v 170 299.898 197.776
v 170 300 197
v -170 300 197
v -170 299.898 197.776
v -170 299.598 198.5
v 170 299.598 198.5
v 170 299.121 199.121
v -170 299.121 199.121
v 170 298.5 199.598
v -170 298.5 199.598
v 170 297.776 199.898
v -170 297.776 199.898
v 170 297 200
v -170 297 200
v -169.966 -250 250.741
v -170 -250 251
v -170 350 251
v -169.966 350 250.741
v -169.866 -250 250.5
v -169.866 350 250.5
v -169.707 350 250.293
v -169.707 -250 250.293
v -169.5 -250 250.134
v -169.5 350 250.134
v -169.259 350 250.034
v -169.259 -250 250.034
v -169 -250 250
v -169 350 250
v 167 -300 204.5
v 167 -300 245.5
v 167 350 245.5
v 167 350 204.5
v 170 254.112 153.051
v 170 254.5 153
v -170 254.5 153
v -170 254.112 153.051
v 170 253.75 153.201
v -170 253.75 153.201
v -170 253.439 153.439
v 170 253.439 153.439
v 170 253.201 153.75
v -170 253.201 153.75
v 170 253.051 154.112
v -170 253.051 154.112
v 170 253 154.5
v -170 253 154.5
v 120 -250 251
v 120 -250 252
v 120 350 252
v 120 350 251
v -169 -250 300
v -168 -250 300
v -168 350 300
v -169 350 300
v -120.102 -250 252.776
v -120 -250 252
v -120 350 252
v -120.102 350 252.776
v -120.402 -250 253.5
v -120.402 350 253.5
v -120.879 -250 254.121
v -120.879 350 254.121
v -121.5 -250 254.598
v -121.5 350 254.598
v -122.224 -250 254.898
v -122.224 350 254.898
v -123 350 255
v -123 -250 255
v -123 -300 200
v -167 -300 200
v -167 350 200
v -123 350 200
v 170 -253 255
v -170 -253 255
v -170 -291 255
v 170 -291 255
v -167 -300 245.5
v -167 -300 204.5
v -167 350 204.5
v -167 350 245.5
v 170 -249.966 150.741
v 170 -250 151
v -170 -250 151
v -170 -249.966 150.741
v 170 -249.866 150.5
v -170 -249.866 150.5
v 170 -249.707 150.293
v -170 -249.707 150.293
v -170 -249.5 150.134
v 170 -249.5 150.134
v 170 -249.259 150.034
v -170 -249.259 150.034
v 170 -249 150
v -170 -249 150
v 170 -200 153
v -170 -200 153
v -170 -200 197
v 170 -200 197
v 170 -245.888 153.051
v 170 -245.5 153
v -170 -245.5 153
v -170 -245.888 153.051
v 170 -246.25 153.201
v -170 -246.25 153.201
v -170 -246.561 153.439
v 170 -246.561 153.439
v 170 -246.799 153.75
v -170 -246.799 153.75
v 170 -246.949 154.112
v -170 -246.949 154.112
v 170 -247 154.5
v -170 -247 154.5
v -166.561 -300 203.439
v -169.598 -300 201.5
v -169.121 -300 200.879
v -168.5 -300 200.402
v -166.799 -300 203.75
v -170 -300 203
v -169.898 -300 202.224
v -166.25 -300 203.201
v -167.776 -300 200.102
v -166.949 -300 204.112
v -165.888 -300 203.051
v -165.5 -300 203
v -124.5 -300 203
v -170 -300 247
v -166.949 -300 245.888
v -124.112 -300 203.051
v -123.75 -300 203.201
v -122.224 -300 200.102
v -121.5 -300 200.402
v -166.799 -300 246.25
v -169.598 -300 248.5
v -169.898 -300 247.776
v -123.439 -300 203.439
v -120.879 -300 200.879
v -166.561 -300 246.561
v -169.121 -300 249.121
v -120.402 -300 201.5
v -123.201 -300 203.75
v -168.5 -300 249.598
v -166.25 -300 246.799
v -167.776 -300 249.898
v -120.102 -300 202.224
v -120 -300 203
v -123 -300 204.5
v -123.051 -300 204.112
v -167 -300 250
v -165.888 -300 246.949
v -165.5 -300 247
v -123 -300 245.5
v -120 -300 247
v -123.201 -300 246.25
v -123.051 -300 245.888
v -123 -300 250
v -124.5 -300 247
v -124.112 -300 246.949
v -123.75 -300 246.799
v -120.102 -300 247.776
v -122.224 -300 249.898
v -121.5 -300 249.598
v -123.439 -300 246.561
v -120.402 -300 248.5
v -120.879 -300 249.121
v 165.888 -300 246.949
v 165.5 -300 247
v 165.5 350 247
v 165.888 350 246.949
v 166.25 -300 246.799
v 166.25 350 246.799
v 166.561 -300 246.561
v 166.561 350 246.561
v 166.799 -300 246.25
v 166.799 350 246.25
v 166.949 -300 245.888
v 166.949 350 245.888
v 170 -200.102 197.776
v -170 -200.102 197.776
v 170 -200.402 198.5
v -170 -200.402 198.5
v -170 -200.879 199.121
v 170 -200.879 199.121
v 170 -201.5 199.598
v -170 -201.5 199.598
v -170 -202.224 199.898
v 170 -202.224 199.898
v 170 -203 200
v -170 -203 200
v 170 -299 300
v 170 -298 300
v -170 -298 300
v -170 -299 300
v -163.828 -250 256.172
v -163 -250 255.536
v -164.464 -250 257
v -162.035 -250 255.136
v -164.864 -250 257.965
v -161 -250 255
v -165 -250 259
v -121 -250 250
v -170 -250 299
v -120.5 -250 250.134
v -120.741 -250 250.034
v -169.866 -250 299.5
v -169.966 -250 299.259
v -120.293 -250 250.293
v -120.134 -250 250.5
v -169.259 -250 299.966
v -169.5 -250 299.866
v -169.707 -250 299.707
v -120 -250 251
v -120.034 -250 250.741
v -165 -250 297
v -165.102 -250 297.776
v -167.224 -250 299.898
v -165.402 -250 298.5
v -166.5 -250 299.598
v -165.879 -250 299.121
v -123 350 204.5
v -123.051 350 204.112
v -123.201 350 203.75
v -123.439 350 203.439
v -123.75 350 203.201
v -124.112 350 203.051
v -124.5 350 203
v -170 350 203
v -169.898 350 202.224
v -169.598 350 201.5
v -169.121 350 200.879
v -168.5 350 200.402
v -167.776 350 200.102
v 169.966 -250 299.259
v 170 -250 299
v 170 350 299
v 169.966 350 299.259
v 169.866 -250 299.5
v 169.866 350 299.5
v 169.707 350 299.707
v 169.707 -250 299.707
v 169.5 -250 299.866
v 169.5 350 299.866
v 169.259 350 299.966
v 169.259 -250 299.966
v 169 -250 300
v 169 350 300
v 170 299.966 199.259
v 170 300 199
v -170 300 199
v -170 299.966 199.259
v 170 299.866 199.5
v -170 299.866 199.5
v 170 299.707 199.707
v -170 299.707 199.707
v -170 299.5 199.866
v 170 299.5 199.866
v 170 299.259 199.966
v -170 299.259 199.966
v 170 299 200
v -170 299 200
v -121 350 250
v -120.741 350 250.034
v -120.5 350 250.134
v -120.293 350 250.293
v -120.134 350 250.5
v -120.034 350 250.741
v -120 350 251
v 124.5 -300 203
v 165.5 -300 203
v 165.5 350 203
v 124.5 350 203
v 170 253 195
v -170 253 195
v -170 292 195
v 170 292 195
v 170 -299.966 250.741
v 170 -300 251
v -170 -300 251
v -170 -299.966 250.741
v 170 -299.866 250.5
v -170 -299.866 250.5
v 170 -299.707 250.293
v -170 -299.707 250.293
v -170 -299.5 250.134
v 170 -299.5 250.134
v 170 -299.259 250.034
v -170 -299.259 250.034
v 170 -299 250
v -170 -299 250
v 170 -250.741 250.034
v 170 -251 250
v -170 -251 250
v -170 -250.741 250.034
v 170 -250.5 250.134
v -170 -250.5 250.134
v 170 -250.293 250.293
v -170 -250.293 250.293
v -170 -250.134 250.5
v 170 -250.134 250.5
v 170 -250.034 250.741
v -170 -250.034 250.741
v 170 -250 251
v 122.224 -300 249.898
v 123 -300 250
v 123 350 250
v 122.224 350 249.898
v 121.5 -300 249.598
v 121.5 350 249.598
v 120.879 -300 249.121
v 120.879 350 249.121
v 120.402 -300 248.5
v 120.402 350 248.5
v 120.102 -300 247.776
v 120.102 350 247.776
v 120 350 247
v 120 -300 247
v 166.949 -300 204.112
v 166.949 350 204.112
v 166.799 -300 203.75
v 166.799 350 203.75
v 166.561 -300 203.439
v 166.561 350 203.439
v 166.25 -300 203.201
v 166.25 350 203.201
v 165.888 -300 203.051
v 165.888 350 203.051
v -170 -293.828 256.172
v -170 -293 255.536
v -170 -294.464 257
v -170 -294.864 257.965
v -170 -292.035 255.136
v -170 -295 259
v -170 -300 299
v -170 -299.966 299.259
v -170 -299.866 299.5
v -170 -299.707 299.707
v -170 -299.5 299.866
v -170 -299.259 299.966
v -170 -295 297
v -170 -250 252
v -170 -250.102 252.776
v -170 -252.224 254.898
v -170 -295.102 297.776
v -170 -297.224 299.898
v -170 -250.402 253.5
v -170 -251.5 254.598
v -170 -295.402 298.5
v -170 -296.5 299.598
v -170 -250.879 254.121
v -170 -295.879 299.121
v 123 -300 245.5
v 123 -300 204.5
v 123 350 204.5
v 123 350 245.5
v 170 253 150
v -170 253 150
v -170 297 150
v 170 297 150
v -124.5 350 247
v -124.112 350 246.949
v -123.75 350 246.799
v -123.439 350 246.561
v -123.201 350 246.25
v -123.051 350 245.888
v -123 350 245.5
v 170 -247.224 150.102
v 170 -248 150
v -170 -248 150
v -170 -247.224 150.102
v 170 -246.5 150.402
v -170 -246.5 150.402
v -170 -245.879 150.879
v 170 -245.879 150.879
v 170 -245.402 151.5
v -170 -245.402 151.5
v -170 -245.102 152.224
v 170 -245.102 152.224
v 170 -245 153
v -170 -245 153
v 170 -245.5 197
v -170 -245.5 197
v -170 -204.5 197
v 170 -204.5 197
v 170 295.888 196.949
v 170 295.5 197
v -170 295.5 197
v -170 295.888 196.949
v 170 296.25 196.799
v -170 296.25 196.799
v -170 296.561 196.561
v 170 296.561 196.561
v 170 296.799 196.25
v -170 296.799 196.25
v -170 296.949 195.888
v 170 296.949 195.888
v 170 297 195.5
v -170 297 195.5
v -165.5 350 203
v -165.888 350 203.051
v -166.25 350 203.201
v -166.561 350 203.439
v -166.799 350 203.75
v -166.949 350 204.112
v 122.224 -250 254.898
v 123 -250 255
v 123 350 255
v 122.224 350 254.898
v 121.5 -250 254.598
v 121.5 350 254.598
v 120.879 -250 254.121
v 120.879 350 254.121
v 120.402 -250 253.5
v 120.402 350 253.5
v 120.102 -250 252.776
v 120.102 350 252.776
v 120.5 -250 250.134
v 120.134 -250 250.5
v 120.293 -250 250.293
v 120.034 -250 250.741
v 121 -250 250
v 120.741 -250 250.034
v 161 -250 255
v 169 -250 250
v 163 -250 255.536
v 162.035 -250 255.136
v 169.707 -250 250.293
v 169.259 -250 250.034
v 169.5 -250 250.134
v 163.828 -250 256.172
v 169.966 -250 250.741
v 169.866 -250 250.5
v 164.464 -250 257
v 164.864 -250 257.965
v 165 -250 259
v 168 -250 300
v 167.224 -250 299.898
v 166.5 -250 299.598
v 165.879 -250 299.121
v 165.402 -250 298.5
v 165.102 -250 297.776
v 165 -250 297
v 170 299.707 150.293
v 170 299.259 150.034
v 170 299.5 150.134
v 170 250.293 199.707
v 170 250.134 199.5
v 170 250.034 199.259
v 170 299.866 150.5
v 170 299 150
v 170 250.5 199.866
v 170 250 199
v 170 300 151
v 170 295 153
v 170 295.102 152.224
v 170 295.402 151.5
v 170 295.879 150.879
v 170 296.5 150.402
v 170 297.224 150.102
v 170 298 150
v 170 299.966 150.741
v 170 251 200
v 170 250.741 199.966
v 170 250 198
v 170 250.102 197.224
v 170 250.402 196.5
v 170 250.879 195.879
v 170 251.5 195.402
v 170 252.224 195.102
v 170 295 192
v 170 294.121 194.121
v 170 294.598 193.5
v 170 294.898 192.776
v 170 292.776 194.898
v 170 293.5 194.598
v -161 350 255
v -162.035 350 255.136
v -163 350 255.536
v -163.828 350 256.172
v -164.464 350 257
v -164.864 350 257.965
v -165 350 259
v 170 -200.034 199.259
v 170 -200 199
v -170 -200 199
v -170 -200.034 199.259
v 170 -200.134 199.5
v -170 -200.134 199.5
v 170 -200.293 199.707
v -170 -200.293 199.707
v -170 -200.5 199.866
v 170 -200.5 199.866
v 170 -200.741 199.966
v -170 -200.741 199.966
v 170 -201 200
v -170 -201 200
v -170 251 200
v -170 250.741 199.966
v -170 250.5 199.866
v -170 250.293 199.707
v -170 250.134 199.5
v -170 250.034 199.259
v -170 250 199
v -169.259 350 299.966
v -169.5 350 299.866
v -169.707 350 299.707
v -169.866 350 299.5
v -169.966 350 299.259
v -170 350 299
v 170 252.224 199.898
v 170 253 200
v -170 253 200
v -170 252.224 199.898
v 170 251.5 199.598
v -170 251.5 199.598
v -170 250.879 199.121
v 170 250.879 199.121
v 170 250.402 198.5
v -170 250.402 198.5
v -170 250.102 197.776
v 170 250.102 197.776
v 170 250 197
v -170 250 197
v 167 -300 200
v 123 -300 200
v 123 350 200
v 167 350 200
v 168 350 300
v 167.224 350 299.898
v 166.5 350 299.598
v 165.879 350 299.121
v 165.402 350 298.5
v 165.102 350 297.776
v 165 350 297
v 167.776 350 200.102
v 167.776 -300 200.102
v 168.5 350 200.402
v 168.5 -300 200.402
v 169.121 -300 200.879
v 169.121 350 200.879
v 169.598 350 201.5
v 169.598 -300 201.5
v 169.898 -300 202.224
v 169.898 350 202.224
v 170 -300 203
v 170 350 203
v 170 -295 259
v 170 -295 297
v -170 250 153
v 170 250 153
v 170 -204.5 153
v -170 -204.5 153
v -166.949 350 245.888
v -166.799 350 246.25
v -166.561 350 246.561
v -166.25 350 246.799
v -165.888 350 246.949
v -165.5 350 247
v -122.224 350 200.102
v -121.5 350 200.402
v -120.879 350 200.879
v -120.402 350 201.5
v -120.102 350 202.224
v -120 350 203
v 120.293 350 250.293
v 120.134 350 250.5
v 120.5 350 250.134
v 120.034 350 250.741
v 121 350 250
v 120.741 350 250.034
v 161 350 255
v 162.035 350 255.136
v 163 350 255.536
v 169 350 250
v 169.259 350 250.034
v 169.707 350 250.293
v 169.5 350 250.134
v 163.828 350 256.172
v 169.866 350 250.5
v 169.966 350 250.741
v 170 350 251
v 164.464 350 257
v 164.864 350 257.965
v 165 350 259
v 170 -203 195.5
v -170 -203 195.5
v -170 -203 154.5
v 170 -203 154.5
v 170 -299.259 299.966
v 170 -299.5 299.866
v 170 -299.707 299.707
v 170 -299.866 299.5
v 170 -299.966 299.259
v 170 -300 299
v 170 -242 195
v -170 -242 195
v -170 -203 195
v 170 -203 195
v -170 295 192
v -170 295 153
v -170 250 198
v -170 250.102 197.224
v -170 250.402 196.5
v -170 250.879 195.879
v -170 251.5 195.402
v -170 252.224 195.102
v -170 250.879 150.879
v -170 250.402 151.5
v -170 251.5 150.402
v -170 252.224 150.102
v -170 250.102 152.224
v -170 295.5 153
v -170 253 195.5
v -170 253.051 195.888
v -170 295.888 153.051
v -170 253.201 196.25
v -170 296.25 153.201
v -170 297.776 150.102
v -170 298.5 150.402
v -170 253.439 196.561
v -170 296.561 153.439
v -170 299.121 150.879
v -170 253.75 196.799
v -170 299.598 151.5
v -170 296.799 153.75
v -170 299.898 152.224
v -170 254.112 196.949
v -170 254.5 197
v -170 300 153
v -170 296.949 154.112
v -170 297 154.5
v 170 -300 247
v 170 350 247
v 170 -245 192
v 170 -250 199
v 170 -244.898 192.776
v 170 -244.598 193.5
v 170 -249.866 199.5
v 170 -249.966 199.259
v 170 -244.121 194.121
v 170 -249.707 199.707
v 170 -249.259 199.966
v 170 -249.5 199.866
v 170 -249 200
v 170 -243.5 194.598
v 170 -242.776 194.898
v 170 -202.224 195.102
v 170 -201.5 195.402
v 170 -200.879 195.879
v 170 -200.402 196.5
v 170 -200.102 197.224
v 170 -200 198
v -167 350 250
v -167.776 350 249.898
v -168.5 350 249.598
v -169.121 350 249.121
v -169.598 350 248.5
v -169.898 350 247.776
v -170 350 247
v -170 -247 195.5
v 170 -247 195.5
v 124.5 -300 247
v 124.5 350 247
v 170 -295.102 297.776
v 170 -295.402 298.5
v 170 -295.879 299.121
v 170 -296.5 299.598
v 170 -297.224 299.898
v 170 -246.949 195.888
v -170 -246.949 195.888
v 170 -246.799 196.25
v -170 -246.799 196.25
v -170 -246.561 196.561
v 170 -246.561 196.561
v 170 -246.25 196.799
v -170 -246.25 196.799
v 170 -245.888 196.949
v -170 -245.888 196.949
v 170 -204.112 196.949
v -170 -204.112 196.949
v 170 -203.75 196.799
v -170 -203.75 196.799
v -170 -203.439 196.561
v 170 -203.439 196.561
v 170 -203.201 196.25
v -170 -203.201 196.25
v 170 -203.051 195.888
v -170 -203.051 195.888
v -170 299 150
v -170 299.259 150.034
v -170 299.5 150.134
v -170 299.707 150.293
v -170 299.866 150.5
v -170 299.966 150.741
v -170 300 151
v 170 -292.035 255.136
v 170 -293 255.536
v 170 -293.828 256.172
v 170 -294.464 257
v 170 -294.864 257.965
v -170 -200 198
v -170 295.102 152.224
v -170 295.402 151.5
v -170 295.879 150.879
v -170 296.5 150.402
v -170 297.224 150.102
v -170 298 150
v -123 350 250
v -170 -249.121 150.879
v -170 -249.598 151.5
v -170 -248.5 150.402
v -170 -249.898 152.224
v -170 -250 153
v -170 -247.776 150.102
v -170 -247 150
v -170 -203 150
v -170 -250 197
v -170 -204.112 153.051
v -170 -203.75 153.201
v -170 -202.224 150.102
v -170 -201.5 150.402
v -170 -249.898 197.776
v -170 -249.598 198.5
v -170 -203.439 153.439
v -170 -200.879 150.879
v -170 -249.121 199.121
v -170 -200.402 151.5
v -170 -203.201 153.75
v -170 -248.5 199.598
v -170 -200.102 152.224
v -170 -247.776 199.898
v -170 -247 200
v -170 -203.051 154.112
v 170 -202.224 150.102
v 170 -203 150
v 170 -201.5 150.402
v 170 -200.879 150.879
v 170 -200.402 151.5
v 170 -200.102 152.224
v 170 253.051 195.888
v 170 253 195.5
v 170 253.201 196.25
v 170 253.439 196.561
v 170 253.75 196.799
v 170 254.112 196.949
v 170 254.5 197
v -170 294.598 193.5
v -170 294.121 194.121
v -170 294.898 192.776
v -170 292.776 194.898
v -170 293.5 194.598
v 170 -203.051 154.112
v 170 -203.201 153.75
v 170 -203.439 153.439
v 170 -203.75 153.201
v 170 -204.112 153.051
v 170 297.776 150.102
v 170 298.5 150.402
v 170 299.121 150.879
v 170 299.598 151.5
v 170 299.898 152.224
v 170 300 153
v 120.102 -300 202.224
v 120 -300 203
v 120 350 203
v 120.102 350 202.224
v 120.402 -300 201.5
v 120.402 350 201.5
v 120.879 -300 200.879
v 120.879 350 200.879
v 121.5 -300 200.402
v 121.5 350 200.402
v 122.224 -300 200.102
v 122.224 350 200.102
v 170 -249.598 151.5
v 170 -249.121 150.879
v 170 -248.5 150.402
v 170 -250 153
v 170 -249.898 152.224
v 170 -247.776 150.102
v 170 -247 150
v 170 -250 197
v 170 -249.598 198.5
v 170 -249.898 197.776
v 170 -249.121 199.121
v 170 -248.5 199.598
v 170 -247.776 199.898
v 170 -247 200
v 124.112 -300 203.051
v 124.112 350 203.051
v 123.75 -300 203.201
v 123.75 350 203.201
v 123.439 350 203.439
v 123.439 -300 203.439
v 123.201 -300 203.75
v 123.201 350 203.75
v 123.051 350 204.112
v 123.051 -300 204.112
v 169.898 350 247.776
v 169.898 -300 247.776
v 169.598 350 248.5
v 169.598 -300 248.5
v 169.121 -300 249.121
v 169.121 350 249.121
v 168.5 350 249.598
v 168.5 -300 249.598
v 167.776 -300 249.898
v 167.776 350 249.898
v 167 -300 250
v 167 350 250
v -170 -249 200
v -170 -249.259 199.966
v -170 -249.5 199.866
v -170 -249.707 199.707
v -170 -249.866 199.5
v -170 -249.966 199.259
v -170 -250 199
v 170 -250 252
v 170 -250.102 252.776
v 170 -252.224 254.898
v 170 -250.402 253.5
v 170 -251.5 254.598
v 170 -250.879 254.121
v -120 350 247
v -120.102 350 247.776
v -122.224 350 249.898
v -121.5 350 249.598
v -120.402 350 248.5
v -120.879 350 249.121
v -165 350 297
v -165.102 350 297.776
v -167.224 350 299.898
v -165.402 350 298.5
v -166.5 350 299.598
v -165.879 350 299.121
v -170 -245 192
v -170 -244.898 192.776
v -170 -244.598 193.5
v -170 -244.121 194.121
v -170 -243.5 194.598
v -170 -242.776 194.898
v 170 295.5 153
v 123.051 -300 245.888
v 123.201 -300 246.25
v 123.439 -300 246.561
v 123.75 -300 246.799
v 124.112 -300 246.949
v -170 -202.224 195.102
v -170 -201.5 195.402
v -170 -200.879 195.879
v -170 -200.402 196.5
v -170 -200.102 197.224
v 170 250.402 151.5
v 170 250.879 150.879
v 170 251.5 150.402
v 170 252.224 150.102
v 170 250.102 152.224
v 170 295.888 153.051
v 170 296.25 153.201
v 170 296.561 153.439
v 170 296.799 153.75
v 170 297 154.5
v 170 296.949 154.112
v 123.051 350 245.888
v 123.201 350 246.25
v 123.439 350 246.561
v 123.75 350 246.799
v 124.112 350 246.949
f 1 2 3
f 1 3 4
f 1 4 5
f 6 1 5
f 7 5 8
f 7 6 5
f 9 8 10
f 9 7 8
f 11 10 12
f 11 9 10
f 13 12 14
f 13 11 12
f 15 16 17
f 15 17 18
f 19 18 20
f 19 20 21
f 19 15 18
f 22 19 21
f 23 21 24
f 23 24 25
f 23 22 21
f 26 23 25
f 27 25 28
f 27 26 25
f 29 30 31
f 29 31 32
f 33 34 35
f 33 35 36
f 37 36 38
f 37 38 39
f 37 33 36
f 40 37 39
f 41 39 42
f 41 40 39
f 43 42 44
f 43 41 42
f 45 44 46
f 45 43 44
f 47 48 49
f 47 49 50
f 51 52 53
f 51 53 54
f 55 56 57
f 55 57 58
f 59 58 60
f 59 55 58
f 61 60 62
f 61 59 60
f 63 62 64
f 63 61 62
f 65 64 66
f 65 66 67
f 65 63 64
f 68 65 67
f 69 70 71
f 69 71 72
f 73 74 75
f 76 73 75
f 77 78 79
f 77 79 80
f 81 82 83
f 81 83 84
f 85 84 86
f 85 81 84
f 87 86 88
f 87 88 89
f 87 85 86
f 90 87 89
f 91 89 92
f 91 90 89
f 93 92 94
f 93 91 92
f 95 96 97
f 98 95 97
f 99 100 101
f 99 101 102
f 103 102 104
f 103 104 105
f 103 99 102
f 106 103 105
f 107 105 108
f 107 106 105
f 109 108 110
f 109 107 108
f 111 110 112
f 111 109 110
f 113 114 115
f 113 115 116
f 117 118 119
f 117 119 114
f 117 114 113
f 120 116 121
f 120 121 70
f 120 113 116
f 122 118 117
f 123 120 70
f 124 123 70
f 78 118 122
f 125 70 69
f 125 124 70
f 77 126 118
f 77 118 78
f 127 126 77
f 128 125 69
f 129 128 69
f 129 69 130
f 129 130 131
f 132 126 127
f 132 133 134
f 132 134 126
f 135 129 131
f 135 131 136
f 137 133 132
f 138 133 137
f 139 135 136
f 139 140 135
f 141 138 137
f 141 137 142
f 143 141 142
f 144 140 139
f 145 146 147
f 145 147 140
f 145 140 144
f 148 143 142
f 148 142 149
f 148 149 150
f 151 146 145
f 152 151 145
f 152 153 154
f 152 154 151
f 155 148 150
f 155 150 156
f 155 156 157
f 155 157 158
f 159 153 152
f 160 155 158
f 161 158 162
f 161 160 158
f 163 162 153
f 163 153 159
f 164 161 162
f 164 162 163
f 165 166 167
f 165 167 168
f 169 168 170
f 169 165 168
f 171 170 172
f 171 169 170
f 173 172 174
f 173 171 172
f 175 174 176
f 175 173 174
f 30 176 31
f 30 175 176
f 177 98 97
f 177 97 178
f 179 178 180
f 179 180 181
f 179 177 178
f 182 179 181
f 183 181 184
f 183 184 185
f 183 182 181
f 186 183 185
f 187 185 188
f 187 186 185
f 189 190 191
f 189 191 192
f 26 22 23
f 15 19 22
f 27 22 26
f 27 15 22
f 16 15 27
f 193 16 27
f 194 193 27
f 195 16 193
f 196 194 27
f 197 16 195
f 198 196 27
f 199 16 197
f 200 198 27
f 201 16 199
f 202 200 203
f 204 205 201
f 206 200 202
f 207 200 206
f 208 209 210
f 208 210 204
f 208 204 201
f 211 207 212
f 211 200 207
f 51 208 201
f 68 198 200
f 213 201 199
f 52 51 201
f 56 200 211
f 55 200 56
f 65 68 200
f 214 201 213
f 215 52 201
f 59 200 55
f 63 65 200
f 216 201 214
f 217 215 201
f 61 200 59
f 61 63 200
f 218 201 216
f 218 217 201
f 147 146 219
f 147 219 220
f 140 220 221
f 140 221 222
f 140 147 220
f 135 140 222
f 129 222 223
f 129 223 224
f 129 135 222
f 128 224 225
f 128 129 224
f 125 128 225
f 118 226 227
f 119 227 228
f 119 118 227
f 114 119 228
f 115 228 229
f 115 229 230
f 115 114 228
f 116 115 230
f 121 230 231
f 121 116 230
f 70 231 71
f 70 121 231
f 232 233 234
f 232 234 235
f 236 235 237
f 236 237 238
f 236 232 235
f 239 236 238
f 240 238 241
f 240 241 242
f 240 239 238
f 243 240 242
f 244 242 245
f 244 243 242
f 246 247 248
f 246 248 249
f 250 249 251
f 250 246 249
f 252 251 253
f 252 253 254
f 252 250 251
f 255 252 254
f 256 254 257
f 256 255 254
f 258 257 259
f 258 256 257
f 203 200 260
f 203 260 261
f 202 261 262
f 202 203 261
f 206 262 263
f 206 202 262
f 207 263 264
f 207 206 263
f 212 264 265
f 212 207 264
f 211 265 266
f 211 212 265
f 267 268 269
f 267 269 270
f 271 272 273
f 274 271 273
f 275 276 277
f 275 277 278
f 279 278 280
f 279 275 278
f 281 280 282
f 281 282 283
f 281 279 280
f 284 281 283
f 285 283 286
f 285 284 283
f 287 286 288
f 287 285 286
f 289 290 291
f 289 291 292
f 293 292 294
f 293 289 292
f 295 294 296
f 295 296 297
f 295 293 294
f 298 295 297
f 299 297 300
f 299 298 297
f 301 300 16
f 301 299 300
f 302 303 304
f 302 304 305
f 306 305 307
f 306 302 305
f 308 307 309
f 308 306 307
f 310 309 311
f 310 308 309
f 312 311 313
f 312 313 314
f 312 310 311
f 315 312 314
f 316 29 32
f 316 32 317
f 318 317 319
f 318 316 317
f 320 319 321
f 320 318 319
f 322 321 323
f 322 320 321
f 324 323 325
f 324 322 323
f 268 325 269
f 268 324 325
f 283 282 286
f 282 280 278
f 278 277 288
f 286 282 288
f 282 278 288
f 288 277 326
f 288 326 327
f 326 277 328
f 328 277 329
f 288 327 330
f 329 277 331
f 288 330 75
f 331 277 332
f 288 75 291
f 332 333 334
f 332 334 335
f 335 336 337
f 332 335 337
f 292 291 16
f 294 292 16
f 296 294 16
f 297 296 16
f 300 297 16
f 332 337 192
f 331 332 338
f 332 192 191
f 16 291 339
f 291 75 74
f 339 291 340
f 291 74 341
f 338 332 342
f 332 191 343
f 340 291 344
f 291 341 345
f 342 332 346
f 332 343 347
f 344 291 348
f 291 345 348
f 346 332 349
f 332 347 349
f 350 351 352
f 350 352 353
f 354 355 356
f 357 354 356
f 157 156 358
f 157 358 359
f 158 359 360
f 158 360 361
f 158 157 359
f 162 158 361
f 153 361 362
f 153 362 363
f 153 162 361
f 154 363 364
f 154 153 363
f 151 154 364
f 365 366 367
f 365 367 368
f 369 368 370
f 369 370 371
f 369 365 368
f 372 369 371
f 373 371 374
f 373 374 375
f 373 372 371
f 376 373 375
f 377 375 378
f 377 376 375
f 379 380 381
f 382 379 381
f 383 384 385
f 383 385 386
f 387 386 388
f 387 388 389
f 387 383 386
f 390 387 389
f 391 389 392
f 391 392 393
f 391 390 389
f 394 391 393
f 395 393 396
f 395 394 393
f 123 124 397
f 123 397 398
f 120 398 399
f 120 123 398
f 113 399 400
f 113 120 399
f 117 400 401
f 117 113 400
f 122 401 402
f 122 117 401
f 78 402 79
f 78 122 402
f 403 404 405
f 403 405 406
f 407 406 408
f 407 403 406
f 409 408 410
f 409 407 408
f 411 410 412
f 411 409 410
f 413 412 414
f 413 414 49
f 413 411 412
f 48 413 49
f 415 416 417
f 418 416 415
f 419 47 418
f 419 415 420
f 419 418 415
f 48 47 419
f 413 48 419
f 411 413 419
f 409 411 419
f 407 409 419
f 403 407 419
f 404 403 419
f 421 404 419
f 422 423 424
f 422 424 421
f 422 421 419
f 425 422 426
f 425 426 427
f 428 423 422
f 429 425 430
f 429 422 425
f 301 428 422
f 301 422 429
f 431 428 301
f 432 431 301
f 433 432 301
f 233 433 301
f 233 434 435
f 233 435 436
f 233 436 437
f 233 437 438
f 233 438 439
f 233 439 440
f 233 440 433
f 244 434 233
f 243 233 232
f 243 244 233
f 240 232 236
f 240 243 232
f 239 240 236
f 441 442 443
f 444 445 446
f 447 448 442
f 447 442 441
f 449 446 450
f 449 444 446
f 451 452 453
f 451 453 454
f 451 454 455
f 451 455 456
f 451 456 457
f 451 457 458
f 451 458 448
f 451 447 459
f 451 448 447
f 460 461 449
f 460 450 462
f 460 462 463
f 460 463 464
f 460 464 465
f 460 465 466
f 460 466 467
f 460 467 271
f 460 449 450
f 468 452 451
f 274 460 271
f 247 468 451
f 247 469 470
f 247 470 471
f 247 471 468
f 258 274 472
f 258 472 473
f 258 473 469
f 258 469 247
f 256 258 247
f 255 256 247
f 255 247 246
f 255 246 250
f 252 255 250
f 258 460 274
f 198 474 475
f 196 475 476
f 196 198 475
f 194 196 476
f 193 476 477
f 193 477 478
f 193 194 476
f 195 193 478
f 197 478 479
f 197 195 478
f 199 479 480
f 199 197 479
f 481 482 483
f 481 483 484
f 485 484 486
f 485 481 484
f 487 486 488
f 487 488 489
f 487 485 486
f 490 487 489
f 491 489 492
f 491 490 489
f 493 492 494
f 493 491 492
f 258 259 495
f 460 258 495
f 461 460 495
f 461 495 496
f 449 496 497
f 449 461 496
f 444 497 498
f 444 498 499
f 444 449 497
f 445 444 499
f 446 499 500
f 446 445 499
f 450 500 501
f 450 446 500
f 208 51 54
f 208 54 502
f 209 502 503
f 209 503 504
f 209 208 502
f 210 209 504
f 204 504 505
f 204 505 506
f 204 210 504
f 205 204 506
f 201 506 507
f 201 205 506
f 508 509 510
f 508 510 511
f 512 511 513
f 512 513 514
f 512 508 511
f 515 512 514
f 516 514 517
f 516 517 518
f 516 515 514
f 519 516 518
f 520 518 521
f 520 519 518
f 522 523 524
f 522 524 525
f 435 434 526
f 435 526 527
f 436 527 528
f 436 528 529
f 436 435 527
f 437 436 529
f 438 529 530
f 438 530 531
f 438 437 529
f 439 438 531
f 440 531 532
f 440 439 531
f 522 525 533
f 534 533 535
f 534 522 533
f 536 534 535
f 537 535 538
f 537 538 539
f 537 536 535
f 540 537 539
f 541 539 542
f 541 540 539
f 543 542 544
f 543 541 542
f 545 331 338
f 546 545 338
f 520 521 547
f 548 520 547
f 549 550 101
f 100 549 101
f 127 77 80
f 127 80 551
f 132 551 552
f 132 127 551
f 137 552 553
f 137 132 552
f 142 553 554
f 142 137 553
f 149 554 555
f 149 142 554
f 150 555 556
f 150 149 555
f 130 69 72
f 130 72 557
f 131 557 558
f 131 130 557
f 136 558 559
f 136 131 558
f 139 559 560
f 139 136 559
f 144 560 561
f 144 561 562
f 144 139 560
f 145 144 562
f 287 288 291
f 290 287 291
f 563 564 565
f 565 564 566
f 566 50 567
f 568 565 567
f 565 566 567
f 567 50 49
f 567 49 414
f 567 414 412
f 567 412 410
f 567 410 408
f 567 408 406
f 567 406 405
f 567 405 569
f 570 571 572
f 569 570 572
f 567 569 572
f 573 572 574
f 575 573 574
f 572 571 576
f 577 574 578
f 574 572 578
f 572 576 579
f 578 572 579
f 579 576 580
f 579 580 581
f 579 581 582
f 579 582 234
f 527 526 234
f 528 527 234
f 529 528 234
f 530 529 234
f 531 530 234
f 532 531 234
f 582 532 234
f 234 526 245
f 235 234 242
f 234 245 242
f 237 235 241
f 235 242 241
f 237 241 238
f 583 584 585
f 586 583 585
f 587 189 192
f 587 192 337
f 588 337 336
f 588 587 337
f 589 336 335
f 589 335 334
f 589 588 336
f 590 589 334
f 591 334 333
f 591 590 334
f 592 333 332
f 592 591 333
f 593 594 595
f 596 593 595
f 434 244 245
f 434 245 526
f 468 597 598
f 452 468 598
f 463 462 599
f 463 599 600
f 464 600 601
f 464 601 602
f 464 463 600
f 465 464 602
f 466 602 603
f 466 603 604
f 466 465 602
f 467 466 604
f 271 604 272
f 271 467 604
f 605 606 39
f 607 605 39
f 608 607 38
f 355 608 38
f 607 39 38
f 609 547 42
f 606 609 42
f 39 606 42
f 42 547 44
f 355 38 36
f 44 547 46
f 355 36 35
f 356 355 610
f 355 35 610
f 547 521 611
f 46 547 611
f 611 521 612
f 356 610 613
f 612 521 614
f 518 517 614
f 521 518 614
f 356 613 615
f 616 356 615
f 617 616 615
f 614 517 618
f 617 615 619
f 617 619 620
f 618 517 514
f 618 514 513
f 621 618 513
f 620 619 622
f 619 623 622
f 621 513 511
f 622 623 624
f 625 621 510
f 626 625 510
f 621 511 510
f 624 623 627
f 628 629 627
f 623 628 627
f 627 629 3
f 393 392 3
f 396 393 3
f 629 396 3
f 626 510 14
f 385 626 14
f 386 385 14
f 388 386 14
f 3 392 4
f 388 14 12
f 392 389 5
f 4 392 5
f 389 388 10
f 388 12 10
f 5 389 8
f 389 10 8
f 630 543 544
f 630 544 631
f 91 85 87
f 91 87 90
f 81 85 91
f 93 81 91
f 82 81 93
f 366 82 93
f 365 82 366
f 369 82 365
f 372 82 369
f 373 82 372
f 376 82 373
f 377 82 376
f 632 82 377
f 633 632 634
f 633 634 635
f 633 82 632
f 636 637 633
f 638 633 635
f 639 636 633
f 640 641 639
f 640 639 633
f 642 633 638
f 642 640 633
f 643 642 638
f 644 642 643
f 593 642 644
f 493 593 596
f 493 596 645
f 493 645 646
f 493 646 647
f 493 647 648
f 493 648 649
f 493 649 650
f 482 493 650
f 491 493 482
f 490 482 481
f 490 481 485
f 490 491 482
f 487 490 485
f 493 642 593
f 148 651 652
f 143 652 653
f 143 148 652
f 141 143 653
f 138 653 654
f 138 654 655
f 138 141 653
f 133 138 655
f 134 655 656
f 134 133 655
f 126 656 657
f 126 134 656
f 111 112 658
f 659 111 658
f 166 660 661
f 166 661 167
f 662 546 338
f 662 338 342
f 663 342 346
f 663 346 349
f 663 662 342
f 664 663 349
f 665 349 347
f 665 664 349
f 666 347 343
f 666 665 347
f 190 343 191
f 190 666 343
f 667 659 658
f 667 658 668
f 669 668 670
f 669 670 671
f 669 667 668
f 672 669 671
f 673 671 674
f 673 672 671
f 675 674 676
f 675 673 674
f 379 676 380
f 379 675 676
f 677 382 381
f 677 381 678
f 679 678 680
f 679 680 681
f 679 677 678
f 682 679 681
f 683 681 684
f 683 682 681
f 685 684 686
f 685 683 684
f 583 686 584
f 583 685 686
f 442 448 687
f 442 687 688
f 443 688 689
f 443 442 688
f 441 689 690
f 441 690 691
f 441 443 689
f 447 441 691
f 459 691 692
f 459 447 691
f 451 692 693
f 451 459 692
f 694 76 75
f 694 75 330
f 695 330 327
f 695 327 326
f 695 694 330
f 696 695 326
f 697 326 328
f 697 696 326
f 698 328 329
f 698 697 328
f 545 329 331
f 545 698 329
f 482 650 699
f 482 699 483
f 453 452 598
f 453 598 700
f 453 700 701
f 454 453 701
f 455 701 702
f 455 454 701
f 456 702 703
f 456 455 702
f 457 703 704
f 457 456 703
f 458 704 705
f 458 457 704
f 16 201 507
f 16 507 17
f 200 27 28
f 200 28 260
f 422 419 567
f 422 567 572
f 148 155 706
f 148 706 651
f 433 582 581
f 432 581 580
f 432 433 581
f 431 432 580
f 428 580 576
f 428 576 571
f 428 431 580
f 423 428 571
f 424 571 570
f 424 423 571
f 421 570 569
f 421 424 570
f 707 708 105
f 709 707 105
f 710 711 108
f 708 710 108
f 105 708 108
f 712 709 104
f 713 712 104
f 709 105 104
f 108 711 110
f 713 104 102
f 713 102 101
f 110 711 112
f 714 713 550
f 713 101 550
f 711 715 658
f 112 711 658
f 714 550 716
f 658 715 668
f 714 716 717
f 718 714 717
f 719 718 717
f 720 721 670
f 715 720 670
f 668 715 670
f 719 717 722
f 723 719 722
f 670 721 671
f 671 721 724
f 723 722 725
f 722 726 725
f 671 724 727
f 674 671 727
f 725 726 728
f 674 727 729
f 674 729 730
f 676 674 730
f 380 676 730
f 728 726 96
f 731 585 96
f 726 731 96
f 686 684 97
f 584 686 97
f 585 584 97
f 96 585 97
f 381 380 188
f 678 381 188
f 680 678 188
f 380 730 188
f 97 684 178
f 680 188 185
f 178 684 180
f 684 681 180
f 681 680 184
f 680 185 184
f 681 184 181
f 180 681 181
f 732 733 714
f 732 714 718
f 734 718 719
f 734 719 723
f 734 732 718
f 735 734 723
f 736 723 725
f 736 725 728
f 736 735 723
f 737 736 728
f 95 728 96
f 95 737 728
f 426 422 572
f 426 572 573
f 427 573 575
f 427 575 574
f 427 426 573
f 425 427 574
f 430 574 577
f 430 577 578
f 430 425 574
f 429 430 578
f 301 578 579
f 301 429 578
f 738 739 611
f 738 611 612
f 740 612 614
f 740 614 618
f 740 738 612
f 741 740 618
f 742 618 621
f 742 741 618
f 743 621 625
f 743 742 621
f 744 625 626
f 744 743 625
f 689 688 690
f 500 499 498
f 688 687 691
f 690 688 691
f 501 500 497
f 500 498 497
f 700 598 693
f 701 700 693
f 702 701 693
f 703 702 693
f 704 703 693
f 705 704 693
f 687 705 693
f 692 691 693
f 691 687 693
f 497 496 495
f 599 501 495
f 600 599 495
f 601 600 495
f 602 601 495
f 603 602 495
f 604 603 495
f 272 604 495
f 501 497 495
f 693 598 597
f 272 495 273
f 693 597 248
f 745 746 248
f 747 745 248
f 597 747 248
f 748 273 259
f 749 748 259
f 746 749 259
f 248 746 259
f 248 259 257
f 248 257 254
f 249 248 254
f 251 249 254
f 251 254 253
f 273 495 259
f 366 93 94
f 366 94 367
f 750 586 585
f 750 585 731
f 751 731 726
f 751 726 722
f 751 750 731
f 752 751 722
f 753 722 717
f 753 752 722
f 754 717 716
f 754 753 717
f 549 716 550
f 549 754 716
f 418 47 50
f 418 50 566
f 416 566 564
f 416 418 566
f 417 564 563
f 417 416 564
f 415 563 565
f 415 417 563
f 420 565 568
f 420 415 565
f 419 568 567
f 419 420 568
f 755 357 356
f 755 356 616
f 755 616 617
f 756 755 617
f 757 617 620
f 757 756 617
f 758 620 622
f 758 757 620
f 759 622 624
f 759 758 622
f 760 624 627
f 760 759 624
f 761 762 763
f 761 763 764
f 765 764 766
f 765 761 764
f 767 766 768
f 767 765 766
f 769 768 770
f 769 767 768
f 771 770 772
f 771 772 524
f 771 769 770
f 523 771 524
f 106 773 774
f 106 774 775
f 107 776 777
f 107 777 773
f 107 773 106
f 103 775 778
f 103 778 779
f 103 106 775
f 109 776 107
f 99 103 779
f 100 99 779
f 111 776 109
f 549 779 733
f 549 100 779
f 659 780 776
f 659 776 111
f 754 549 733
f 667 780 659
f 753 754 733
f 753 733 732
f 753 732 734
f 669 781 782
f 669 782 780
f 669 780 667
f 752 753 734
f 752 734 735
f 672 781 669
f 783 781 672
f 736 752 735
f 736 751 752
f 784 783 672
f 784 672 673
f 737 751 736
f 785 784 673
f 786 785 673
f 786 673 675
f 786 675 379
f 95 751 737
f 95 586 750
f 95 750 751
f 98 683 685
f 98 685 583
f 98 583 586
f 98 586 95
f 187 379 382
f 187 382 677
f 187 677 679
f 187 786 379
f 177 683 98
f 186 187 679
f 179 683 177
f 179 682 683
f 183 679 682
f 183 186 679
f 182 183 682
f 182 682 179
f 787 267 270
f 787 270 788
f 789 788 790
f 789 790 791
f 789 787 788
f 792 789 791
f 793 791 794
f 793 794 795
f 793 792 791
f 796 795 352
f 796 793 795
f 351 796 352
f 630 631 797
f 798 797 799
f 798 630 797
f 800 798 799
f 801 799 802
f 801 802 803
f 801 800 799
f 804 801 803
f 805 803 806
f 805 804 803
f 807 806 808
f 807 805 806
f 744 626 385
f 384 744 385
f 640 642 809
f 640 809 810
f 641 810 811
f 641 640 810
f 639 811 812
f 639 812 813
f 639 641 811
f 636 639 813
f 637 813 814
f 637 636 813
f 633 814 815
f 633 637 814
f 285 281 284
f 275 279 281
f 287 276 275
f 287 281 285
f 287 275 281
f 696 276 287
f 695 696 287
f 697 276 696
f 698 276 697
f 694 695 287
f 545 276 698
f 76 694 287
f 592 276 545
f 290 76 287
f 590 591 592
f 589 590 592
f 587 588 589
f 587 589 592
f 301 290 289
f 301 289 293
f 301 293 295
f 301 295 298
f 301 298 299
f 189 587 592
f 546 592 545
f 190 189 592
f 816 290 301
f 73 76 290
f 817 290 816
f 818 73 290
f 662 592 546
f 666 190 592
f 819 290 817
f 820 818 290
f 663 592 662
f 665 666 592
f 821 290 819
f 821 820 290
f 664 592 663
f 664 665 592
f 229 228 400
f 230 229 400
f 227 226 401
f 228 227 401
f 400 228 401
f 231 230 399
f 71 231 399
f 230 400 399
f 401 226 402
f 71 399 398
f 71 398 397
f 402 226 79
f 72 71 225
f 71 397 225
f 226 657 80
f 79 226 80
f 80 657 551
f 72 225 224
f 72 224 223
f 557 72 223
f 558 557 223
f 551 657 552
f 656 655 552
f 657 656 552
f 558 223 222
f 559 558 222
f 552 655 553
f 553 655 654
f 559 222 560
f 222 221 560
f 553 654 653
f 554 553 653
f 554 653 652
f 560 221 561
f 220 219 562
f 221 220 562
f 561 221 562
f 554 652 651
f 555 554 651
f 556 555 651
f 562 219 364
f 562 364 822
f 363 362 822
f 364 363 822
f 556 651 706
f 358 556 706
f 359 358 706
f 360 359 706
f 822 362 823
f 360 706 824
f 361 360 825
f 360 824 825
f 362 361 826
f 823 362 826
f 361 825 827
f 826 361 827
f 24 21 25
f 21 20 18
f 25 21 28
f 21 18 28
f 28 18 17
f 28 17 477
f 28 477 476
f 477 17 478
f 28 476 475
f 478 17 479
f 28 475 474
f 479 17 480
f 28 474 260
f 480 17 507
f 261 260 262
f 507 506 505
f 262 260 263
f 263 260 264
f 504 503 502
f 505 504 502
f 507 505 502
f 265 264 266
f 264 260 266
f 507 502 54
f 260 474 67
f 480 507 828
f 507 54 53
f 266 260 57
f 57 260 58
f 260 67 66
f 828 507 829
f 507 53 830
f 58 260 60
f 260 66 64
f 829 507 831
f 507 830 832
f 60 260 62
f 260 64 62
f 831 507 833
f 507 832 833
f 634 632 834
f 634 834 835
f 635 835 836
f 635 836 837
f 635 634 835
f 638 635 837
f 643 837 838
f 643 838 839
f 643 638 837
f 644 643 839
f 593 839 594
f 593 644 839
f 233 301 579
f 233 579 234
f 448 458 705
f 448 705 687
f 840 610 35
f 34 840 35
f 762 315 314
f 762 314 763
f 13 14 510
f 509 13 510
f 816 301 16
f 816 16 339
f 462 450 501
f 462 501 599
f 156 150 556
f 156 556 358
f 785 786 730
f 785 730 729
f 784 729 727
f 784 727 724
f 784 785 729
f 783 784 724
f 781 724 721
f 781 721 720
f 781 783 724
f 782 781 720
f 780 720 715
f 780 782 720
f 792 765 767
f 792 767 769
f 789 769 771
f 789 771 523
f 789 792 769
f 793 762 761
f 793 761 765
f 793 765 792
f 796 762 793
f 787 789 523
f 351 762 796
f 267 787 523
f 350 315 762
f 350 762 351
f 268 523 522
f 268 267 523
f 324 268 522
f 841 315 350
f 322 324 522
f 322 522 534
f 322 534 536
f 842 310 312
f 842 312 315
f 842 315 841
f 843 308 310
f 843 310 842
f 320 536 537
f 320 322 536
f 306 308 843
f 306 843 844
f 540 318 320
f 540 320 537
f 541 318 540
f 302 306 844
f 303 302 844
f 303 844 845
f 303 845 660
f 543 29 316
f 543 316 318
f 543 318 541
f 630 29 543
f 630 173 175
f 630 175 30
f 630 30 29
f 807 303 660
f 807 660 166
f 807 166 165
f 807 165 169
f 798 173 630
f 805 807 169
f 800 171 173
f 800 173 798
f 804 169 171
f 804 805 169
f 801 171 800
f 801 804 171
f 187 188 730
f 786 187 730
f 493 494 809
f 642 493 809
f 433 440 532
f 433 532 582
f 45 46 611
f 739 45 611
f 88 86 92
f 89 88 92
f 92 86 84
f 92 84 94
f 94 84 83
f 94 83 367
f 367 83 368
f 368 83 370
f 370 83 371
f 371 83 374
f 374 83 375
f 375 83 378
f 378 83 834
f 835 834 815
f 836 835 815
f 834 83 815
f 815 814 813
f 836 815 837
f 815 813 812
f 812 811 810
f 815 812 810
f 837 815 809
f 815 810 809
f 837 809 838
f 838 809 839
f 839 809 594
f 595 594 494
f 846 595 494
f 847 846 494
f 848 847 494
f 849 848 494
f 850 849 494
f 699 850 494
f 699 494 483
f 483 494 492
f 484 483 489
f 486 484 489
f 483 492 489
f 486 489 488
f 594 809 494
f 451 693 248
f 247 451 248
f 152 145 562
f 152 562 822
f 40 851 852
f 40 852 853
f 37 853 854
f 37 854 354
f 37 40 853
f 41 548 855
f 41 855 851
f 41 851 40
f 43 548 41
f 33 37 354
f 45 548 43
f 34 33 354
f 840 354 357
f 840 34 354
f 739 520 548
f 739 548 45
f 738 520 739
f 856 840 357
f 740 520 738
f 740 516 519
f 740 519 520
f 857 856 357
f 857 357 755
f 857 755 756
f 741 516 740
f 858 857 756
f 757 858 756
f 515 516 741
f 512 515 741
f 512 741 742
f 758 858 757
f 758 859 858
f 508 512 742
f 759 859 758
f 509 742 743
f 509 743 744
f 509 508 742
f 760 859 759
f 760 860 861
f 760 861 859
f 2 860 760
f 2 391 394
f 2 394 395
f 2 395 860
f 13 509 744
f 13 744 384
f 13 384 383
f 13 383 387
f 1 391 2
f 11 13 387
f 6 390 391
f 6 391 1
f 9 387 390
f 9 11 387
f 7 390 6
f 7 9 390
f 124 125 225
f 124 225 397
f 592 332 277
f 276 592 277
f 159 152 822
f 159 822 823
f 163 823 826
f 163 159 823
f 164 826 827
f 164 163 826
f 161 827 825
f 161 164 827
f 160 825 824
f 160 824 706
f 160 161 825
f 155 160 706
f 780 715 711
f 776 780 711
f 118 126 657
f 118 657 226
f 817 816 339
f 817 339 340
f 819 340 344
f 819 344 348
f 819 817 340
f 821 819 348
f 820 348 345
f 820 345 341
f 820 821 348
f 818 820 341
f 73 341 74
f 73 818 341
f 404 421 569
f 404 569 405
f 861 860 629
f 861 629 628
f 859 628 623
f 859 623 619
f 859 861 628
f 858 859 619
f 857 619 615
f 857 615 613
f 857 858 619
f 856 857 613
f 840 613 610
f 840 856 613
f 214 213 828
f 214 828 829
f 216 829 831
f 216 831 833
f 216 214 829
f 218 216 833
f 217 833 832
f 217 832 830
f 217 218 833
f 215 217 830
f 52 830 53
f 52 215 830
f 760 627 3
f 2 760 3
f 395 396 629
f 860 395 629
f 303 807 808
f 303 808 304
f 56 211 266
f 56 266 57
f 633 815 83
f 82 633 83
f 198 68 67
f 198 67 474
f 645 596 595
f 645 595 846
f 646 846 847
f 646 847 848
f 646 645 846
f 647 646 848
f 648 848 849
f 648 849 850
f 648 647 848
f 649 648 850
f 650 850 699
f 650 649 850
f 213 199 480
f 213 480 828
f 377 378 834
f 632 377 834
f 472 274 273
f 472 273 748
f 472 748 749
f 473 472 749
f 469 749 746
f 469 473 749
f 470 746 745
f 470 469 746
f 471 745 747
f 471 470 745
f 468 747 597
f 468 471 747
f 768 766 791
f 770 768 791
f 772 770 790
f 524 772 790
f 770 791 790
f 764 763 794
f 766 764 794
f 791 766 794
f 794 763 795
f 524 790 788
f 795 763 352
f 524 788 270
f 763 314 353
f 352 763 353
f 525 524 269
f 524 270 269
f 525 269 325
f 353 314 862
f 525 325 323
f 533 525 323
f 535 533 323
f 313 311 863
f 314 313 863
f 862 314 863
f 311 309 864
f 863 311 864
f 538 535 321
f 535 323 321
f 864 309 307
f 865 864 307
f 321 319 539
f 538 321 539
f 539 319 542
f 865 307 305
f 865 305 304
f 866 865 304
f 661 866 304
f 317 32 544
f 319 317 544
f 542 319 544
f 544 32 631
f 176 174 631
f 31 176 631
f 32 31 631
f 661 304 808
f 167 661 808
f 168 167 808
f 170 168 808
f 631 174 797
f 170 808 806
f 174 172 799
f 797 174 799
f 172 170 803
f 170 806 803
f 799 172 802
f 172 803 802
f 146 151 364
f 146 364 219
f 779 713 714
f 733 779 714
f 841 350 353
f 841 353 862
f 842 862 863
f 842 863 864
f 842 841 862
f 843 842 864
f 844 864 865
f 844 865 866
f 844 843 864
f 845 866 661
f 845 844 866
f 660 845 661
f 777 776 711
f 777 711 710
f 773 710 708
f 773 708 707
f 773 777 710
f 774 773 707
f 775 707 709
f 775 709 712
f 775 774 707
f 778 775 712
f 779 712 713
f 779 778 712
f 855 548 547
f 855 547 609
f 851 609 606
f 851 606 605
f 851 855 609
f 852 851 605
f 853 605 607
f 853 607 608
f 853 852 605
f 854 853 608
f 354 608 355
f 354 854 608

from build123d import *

# Parameters (mm, degrees)
F2_DEPTH  = 650
F5_DEPTH  = 600
F8_DEPTH  = 340
F10_DEPTH = 340
F12_DEPTH = 340


with BuildPart() as f2:
    # F1 (on offset) → F2 (new body)
    with BuildSketch(Plane.XZ.offset(300)):
        with BuildLine():
            Line((-123, 250), (-167, 250))
            ThreePointArc((-167, 250), (-169.12132, 249.12132), (-170, 247))
            Line((-170, 247), (-170, 203))
            ThreePointArc((-170, 203), (-169.12132, 200.87868), (-167, 200))
            Line((-167, 200), (-123, 200))
            ThreePointArc((-123, 200), (-120.87868, 200.87868), (-120, 203))
            Line((-120, 203), (-120, 247))
            ThreePointArc((-120, 247), (-120.87868, 249.12132), (-123, 250))
        make_face()
        with BuildLine():
            Line((-124.5, 203), (-165.5, 203))
            ThreePointArc((-165.5, 203), (-166.56066, 203.43934), (-167, 204.5))
            Line((-167, 204.5), (-167, 245.5))
            ThreePointArc((-167, 245.5), (-166.56066, 246.56066), (-165.5, 247))
            Line((-165.5, 247), (-124.5, 247))
            ThreePointArc((-124.5, 247), (-123.43934, 246.56066), (-123, 245.5))
            Line((-123, 245.5), (-123, 204.5))
            ThreePointArc((-123, 204.5), (-123.43934, 203.43934), (-124.5, 203))
        make_face(mode=Mode.SUBTRACT)
        with BuildLine():
            Line((167, 250), (123, 250))
            ThreePointArc((123, 250), (120.87868, 249.12132), (120, 247))
            Line((120, 247), (120, 203))
            ThreePointArc((120, 203), (120.87868, 200.87868), (123, 200))
            Line((123, 200), (167, 200))
            ThreePointArc((167, 200), (169.12132, 200.87868), (170, 203))
            Line((170, 203), (170, 247))
            ThreePointArc((170, 247), (169.12132, 249.12132), (167, 250))
        make_face()
        with BuildLine():
            Line((165.5, 203), (124.5, 203))
            ThreePointArc((124.5, 203), (123.43934, 203.43934), (123, 204.5))
            Line((123, 204.5), (123, 245.5))
            ThreePointArc((123, 245.5), (123.43934, 246.56066), (124.5, 247))
            Line((124.5, 247), (165.5, 247))
            ThreePointArc((165.5, 247), (166.56066, 246.56066), (167, 245.5))
            Line((167, 245.5), (167, 204.5))
            ThreePointArc((167, 204.5), (166.56066, 203.43934), (165.5, 203))
        make_face(mode=Mode.SUBTRACT)
    extrude(amount=-F2_DEPTH)


with BuildPart() as f5:
    # F4 (on offset) → F5 (new body)
    with BuildSketch(Plane.XZ.offset(250)):
        with BuildLine():
            Line((-168, 300), (-169, 300))
            ThreePointArc((-169, 300), (-169.707107, 299.707107), (-170, 299))
            Line((-170, 299), (-170, 251))
            ThreePointArc((-170, 251), (-169.707107, 250.292893), (-169, 250))
            Line((-169, 250), (-121, 250))
            ThreePointArc((-121, 250), (-120.292893, 250.292893), (-120, 251))
            Line((-120, 251), (-120, 252))
            ThreePointArc((-120, 252), (-120.87868, 254.12132), (-123, 255))
            Line((-123, 255), (-161, 255))
            ThreePointArc((-161, 255), (-163.828427, 256.171573), (-165, 259))
            Line((-165, 259), (-165, 297))
            ThreePointArc((-165, 297), (-165.87868, 299.12132), (-168, 300))
        make_face()
        with BuildLine():
            ThreePointArc((169, 250), (169.707107, 250.292893), (170, 251))
            Line((170, 251), (170, 299))
            ThreePointArc((170, 299), (169.707107, 299.707107), (169, 300))
            Line((169, 300), (168, 300))
            ThreePointArc((168, 300), (165.87868, 299.12132), (165, 297))
            Line((165, 297), (165, 259))
            ThreePointArc((165, 259), (163.828427, 256.171573), (161, 255))
            Line((161, 255), (123, 255))
            ThreePointArc((123, 255), (120.87868, 254.12132), (120, 252))
            Line((120, 252), (120, 251))
            ThreePointArc((120, 251), (120.292893, 250.292893), (121, 250))
            Line((121, 250), (169, 250))
        make_face()
    extrude(amount=-F5_DEPTH)


with BuildPart() as f8:
    # F7 (on offset) → F8 (new body)
    with BuildSketch(Plane.YZ.offset(170)):
        with BuildLine():
            ThreePointArc((-299, 300), (-299.707107, 299.707107), (-300, 299))
            Line((-300, 299), (-300, 251))
            ThreePointArc((-300, 251), (-299.707107, 250.292893), (-299, 250))
            Line((-299, 250), (-251, 250))
            ThreePointArc((-251, 250), (-250.292893, 250.292893), (-250, 251))
            Line((-250, 251), (-250, 252))
            ThreePointArc((-250, 252), (-250.87868, 254.12132), (-253, 255))
            Line((-253, 255), (-291, 255))
            ThreePointArc((-291, 255), (-293.828427, 256.171573), (-295, 259))
            Line((-295, 259), (-295, 297))
            ThreePointArc((-295, 297), (-295.87868, 299.12132), (-298, 300))
            Line((-298, 300), (-299, 300))
        make_face()
    extrude(amount=-F8_DEPTH)


with BuildPart() as f10:
    # F9 (on offset) → F10 (new body)
    with BuildSketch(Plane.YZ.offset(170)):
        with BuildLine():
            Line((-203, 200), (-247, 200))
            ThreePointArc((-247, 200), (-249.12132, 199.12132), (-250, 197))
            Line((-250, 197), (-250, 153))
            ThreePointArc((-250, 153), (-249.12132, 150.87868), (-247, 150))
            Line((-247, 150), (-203, 150))
            ThreePointArc((-203, 150), (-200.87868, 150.87868), (-200, 153))
            Line((-200, 153), (-200, 197))
            ThreePointArc((-200, 197), (-200.87868, 199.12132), (-203, 200))
        make_face()
        with BuildLine():
            ThreePointArc((-204.5, 197), (-203.43934, 196.56066), (-203, 195.5))
            Line((-203, 195.5), (-203, 154.5))
            ThreePointArc((-203, 154.5), (-203.43934, 153.43934), (-204.5, 153))
            Line((-204.5, 153), (-245.5, 153))
            ThreePointArc((-245.5, 153), (-246.56066, 153.43934), (-247, 154.5))
            Line((-247, 154.5), (-247, 195.5))
            ThreePointArc((-247, 195.5), (-246.56066, 196.56066), (-245.5, 197))
            Line((-245.5, 197), (-204.5, 197))
        make_face(mode=Mode.SUBTRACT)
        with BuildLine():
            Line((297, 200), (253, 200))
            ThreePointArc((253, 200), (250.87868, 199.12132), (250, 197))
            Line((250, 197), (250, 153))
            ThreePointArc((250, 153), (250.87868, 150.87868), (253, 150))
            Line((253, 150), (297, 150))
            ThreePointArc((297, 150), (299.12132, 150.87868), (300, 153))
            Line((300, 153), (300, 197))
            ThreePointArc((300, 197), (299.12132, 199.12132), (297, 200))
        make_face()
        with BuildLine():
            ThreePointArc((253, 195.5), (253.43934, 196.56066), (254.5, 197))
            Line((254.5, 197), (295.5, 197))
            ThreePointArc((295.5, 197), (296.56066, 196.56066), (297, 195.5))
            Line((297, 195.5), (297, 154.5))
            ThreePointArc((297, 154.5), (296.56066, 153.43934), (295.5, 153))
            Line((295.5, 153), (254.5, 153))
            ThreePointArc((254.5, 153), (253.43934, 153.43934), (253, 154.5))
            Line((253, 154.5), (253, 195.5))
        make_face(mode=Mode.SUBTRACT)
    extrude(amount=-F10_DEPTH)


with BuildPart() as f12:
    # F11 (on offset) → F12 (new body)
    with BuildSketch(Plane.YZ.offset(170)):
        with BuildLine():
            Line((-200, 198), (-200, 199))
            ThreePointArc((-200, 199), (-200.292893, 199.707107), (-201, 200))
            Line((-201, 200), (-249, 200))
            ThreePointArc((-249, 200), (-249.707107, 199.707107), (-250, 199))
            Line((-250, 199), (-250, 151))
            ThreePointArc((-250, 151), (-249.707107, 150.292893), (-249, 150))
            Line((-249, 150), (-248, 150))
            ThreePointArc((-248, 150), (-245.87868, 150.87868), (-245, 153))
            Line((-245, 153), (-245, 192))
            ThreePointArc((-245, 192), (-244.12132, 194.12132), (-242, 195))
            Line((-242, 195), (-203, 195))
            ThreePointArc((-203, 195), (-200.87868, 195.87868), (-200, 198))
        make_face()
        with BuildLine():
            ThreePointArc((251, 200), (250.292893, 199.707107), (250, 199))
            Line((250, 199), (250, 198))
            ThreePointArc((250, 198), (250.87868, 195.87868), (253, 195))
            Line((253, 195), (292, 195))
            ThreePointArc((292, 195), (294.12132, 194.12132), (295, 192))
            Line((295, 192), (295, 153))
            ThreePointArc((295, 153), (295.87868, 150.87868), (298, 150))
            Line((298, 150), (299, 150))
            ThreePointArc((299, 150), (299.707107, 150.292893), (300, 151))
            Line((300, 151), (300, 199))
            ThreePointArc((300, 199), (299.707107, 199.707107), (299, 200))
            Line((299, 200), (251, 200))
        make_face()
    extrude(amount=-F12_DEPTH)


solid = Compound([f2.part, f5.part, f8.part, f10.part, f12.part])
